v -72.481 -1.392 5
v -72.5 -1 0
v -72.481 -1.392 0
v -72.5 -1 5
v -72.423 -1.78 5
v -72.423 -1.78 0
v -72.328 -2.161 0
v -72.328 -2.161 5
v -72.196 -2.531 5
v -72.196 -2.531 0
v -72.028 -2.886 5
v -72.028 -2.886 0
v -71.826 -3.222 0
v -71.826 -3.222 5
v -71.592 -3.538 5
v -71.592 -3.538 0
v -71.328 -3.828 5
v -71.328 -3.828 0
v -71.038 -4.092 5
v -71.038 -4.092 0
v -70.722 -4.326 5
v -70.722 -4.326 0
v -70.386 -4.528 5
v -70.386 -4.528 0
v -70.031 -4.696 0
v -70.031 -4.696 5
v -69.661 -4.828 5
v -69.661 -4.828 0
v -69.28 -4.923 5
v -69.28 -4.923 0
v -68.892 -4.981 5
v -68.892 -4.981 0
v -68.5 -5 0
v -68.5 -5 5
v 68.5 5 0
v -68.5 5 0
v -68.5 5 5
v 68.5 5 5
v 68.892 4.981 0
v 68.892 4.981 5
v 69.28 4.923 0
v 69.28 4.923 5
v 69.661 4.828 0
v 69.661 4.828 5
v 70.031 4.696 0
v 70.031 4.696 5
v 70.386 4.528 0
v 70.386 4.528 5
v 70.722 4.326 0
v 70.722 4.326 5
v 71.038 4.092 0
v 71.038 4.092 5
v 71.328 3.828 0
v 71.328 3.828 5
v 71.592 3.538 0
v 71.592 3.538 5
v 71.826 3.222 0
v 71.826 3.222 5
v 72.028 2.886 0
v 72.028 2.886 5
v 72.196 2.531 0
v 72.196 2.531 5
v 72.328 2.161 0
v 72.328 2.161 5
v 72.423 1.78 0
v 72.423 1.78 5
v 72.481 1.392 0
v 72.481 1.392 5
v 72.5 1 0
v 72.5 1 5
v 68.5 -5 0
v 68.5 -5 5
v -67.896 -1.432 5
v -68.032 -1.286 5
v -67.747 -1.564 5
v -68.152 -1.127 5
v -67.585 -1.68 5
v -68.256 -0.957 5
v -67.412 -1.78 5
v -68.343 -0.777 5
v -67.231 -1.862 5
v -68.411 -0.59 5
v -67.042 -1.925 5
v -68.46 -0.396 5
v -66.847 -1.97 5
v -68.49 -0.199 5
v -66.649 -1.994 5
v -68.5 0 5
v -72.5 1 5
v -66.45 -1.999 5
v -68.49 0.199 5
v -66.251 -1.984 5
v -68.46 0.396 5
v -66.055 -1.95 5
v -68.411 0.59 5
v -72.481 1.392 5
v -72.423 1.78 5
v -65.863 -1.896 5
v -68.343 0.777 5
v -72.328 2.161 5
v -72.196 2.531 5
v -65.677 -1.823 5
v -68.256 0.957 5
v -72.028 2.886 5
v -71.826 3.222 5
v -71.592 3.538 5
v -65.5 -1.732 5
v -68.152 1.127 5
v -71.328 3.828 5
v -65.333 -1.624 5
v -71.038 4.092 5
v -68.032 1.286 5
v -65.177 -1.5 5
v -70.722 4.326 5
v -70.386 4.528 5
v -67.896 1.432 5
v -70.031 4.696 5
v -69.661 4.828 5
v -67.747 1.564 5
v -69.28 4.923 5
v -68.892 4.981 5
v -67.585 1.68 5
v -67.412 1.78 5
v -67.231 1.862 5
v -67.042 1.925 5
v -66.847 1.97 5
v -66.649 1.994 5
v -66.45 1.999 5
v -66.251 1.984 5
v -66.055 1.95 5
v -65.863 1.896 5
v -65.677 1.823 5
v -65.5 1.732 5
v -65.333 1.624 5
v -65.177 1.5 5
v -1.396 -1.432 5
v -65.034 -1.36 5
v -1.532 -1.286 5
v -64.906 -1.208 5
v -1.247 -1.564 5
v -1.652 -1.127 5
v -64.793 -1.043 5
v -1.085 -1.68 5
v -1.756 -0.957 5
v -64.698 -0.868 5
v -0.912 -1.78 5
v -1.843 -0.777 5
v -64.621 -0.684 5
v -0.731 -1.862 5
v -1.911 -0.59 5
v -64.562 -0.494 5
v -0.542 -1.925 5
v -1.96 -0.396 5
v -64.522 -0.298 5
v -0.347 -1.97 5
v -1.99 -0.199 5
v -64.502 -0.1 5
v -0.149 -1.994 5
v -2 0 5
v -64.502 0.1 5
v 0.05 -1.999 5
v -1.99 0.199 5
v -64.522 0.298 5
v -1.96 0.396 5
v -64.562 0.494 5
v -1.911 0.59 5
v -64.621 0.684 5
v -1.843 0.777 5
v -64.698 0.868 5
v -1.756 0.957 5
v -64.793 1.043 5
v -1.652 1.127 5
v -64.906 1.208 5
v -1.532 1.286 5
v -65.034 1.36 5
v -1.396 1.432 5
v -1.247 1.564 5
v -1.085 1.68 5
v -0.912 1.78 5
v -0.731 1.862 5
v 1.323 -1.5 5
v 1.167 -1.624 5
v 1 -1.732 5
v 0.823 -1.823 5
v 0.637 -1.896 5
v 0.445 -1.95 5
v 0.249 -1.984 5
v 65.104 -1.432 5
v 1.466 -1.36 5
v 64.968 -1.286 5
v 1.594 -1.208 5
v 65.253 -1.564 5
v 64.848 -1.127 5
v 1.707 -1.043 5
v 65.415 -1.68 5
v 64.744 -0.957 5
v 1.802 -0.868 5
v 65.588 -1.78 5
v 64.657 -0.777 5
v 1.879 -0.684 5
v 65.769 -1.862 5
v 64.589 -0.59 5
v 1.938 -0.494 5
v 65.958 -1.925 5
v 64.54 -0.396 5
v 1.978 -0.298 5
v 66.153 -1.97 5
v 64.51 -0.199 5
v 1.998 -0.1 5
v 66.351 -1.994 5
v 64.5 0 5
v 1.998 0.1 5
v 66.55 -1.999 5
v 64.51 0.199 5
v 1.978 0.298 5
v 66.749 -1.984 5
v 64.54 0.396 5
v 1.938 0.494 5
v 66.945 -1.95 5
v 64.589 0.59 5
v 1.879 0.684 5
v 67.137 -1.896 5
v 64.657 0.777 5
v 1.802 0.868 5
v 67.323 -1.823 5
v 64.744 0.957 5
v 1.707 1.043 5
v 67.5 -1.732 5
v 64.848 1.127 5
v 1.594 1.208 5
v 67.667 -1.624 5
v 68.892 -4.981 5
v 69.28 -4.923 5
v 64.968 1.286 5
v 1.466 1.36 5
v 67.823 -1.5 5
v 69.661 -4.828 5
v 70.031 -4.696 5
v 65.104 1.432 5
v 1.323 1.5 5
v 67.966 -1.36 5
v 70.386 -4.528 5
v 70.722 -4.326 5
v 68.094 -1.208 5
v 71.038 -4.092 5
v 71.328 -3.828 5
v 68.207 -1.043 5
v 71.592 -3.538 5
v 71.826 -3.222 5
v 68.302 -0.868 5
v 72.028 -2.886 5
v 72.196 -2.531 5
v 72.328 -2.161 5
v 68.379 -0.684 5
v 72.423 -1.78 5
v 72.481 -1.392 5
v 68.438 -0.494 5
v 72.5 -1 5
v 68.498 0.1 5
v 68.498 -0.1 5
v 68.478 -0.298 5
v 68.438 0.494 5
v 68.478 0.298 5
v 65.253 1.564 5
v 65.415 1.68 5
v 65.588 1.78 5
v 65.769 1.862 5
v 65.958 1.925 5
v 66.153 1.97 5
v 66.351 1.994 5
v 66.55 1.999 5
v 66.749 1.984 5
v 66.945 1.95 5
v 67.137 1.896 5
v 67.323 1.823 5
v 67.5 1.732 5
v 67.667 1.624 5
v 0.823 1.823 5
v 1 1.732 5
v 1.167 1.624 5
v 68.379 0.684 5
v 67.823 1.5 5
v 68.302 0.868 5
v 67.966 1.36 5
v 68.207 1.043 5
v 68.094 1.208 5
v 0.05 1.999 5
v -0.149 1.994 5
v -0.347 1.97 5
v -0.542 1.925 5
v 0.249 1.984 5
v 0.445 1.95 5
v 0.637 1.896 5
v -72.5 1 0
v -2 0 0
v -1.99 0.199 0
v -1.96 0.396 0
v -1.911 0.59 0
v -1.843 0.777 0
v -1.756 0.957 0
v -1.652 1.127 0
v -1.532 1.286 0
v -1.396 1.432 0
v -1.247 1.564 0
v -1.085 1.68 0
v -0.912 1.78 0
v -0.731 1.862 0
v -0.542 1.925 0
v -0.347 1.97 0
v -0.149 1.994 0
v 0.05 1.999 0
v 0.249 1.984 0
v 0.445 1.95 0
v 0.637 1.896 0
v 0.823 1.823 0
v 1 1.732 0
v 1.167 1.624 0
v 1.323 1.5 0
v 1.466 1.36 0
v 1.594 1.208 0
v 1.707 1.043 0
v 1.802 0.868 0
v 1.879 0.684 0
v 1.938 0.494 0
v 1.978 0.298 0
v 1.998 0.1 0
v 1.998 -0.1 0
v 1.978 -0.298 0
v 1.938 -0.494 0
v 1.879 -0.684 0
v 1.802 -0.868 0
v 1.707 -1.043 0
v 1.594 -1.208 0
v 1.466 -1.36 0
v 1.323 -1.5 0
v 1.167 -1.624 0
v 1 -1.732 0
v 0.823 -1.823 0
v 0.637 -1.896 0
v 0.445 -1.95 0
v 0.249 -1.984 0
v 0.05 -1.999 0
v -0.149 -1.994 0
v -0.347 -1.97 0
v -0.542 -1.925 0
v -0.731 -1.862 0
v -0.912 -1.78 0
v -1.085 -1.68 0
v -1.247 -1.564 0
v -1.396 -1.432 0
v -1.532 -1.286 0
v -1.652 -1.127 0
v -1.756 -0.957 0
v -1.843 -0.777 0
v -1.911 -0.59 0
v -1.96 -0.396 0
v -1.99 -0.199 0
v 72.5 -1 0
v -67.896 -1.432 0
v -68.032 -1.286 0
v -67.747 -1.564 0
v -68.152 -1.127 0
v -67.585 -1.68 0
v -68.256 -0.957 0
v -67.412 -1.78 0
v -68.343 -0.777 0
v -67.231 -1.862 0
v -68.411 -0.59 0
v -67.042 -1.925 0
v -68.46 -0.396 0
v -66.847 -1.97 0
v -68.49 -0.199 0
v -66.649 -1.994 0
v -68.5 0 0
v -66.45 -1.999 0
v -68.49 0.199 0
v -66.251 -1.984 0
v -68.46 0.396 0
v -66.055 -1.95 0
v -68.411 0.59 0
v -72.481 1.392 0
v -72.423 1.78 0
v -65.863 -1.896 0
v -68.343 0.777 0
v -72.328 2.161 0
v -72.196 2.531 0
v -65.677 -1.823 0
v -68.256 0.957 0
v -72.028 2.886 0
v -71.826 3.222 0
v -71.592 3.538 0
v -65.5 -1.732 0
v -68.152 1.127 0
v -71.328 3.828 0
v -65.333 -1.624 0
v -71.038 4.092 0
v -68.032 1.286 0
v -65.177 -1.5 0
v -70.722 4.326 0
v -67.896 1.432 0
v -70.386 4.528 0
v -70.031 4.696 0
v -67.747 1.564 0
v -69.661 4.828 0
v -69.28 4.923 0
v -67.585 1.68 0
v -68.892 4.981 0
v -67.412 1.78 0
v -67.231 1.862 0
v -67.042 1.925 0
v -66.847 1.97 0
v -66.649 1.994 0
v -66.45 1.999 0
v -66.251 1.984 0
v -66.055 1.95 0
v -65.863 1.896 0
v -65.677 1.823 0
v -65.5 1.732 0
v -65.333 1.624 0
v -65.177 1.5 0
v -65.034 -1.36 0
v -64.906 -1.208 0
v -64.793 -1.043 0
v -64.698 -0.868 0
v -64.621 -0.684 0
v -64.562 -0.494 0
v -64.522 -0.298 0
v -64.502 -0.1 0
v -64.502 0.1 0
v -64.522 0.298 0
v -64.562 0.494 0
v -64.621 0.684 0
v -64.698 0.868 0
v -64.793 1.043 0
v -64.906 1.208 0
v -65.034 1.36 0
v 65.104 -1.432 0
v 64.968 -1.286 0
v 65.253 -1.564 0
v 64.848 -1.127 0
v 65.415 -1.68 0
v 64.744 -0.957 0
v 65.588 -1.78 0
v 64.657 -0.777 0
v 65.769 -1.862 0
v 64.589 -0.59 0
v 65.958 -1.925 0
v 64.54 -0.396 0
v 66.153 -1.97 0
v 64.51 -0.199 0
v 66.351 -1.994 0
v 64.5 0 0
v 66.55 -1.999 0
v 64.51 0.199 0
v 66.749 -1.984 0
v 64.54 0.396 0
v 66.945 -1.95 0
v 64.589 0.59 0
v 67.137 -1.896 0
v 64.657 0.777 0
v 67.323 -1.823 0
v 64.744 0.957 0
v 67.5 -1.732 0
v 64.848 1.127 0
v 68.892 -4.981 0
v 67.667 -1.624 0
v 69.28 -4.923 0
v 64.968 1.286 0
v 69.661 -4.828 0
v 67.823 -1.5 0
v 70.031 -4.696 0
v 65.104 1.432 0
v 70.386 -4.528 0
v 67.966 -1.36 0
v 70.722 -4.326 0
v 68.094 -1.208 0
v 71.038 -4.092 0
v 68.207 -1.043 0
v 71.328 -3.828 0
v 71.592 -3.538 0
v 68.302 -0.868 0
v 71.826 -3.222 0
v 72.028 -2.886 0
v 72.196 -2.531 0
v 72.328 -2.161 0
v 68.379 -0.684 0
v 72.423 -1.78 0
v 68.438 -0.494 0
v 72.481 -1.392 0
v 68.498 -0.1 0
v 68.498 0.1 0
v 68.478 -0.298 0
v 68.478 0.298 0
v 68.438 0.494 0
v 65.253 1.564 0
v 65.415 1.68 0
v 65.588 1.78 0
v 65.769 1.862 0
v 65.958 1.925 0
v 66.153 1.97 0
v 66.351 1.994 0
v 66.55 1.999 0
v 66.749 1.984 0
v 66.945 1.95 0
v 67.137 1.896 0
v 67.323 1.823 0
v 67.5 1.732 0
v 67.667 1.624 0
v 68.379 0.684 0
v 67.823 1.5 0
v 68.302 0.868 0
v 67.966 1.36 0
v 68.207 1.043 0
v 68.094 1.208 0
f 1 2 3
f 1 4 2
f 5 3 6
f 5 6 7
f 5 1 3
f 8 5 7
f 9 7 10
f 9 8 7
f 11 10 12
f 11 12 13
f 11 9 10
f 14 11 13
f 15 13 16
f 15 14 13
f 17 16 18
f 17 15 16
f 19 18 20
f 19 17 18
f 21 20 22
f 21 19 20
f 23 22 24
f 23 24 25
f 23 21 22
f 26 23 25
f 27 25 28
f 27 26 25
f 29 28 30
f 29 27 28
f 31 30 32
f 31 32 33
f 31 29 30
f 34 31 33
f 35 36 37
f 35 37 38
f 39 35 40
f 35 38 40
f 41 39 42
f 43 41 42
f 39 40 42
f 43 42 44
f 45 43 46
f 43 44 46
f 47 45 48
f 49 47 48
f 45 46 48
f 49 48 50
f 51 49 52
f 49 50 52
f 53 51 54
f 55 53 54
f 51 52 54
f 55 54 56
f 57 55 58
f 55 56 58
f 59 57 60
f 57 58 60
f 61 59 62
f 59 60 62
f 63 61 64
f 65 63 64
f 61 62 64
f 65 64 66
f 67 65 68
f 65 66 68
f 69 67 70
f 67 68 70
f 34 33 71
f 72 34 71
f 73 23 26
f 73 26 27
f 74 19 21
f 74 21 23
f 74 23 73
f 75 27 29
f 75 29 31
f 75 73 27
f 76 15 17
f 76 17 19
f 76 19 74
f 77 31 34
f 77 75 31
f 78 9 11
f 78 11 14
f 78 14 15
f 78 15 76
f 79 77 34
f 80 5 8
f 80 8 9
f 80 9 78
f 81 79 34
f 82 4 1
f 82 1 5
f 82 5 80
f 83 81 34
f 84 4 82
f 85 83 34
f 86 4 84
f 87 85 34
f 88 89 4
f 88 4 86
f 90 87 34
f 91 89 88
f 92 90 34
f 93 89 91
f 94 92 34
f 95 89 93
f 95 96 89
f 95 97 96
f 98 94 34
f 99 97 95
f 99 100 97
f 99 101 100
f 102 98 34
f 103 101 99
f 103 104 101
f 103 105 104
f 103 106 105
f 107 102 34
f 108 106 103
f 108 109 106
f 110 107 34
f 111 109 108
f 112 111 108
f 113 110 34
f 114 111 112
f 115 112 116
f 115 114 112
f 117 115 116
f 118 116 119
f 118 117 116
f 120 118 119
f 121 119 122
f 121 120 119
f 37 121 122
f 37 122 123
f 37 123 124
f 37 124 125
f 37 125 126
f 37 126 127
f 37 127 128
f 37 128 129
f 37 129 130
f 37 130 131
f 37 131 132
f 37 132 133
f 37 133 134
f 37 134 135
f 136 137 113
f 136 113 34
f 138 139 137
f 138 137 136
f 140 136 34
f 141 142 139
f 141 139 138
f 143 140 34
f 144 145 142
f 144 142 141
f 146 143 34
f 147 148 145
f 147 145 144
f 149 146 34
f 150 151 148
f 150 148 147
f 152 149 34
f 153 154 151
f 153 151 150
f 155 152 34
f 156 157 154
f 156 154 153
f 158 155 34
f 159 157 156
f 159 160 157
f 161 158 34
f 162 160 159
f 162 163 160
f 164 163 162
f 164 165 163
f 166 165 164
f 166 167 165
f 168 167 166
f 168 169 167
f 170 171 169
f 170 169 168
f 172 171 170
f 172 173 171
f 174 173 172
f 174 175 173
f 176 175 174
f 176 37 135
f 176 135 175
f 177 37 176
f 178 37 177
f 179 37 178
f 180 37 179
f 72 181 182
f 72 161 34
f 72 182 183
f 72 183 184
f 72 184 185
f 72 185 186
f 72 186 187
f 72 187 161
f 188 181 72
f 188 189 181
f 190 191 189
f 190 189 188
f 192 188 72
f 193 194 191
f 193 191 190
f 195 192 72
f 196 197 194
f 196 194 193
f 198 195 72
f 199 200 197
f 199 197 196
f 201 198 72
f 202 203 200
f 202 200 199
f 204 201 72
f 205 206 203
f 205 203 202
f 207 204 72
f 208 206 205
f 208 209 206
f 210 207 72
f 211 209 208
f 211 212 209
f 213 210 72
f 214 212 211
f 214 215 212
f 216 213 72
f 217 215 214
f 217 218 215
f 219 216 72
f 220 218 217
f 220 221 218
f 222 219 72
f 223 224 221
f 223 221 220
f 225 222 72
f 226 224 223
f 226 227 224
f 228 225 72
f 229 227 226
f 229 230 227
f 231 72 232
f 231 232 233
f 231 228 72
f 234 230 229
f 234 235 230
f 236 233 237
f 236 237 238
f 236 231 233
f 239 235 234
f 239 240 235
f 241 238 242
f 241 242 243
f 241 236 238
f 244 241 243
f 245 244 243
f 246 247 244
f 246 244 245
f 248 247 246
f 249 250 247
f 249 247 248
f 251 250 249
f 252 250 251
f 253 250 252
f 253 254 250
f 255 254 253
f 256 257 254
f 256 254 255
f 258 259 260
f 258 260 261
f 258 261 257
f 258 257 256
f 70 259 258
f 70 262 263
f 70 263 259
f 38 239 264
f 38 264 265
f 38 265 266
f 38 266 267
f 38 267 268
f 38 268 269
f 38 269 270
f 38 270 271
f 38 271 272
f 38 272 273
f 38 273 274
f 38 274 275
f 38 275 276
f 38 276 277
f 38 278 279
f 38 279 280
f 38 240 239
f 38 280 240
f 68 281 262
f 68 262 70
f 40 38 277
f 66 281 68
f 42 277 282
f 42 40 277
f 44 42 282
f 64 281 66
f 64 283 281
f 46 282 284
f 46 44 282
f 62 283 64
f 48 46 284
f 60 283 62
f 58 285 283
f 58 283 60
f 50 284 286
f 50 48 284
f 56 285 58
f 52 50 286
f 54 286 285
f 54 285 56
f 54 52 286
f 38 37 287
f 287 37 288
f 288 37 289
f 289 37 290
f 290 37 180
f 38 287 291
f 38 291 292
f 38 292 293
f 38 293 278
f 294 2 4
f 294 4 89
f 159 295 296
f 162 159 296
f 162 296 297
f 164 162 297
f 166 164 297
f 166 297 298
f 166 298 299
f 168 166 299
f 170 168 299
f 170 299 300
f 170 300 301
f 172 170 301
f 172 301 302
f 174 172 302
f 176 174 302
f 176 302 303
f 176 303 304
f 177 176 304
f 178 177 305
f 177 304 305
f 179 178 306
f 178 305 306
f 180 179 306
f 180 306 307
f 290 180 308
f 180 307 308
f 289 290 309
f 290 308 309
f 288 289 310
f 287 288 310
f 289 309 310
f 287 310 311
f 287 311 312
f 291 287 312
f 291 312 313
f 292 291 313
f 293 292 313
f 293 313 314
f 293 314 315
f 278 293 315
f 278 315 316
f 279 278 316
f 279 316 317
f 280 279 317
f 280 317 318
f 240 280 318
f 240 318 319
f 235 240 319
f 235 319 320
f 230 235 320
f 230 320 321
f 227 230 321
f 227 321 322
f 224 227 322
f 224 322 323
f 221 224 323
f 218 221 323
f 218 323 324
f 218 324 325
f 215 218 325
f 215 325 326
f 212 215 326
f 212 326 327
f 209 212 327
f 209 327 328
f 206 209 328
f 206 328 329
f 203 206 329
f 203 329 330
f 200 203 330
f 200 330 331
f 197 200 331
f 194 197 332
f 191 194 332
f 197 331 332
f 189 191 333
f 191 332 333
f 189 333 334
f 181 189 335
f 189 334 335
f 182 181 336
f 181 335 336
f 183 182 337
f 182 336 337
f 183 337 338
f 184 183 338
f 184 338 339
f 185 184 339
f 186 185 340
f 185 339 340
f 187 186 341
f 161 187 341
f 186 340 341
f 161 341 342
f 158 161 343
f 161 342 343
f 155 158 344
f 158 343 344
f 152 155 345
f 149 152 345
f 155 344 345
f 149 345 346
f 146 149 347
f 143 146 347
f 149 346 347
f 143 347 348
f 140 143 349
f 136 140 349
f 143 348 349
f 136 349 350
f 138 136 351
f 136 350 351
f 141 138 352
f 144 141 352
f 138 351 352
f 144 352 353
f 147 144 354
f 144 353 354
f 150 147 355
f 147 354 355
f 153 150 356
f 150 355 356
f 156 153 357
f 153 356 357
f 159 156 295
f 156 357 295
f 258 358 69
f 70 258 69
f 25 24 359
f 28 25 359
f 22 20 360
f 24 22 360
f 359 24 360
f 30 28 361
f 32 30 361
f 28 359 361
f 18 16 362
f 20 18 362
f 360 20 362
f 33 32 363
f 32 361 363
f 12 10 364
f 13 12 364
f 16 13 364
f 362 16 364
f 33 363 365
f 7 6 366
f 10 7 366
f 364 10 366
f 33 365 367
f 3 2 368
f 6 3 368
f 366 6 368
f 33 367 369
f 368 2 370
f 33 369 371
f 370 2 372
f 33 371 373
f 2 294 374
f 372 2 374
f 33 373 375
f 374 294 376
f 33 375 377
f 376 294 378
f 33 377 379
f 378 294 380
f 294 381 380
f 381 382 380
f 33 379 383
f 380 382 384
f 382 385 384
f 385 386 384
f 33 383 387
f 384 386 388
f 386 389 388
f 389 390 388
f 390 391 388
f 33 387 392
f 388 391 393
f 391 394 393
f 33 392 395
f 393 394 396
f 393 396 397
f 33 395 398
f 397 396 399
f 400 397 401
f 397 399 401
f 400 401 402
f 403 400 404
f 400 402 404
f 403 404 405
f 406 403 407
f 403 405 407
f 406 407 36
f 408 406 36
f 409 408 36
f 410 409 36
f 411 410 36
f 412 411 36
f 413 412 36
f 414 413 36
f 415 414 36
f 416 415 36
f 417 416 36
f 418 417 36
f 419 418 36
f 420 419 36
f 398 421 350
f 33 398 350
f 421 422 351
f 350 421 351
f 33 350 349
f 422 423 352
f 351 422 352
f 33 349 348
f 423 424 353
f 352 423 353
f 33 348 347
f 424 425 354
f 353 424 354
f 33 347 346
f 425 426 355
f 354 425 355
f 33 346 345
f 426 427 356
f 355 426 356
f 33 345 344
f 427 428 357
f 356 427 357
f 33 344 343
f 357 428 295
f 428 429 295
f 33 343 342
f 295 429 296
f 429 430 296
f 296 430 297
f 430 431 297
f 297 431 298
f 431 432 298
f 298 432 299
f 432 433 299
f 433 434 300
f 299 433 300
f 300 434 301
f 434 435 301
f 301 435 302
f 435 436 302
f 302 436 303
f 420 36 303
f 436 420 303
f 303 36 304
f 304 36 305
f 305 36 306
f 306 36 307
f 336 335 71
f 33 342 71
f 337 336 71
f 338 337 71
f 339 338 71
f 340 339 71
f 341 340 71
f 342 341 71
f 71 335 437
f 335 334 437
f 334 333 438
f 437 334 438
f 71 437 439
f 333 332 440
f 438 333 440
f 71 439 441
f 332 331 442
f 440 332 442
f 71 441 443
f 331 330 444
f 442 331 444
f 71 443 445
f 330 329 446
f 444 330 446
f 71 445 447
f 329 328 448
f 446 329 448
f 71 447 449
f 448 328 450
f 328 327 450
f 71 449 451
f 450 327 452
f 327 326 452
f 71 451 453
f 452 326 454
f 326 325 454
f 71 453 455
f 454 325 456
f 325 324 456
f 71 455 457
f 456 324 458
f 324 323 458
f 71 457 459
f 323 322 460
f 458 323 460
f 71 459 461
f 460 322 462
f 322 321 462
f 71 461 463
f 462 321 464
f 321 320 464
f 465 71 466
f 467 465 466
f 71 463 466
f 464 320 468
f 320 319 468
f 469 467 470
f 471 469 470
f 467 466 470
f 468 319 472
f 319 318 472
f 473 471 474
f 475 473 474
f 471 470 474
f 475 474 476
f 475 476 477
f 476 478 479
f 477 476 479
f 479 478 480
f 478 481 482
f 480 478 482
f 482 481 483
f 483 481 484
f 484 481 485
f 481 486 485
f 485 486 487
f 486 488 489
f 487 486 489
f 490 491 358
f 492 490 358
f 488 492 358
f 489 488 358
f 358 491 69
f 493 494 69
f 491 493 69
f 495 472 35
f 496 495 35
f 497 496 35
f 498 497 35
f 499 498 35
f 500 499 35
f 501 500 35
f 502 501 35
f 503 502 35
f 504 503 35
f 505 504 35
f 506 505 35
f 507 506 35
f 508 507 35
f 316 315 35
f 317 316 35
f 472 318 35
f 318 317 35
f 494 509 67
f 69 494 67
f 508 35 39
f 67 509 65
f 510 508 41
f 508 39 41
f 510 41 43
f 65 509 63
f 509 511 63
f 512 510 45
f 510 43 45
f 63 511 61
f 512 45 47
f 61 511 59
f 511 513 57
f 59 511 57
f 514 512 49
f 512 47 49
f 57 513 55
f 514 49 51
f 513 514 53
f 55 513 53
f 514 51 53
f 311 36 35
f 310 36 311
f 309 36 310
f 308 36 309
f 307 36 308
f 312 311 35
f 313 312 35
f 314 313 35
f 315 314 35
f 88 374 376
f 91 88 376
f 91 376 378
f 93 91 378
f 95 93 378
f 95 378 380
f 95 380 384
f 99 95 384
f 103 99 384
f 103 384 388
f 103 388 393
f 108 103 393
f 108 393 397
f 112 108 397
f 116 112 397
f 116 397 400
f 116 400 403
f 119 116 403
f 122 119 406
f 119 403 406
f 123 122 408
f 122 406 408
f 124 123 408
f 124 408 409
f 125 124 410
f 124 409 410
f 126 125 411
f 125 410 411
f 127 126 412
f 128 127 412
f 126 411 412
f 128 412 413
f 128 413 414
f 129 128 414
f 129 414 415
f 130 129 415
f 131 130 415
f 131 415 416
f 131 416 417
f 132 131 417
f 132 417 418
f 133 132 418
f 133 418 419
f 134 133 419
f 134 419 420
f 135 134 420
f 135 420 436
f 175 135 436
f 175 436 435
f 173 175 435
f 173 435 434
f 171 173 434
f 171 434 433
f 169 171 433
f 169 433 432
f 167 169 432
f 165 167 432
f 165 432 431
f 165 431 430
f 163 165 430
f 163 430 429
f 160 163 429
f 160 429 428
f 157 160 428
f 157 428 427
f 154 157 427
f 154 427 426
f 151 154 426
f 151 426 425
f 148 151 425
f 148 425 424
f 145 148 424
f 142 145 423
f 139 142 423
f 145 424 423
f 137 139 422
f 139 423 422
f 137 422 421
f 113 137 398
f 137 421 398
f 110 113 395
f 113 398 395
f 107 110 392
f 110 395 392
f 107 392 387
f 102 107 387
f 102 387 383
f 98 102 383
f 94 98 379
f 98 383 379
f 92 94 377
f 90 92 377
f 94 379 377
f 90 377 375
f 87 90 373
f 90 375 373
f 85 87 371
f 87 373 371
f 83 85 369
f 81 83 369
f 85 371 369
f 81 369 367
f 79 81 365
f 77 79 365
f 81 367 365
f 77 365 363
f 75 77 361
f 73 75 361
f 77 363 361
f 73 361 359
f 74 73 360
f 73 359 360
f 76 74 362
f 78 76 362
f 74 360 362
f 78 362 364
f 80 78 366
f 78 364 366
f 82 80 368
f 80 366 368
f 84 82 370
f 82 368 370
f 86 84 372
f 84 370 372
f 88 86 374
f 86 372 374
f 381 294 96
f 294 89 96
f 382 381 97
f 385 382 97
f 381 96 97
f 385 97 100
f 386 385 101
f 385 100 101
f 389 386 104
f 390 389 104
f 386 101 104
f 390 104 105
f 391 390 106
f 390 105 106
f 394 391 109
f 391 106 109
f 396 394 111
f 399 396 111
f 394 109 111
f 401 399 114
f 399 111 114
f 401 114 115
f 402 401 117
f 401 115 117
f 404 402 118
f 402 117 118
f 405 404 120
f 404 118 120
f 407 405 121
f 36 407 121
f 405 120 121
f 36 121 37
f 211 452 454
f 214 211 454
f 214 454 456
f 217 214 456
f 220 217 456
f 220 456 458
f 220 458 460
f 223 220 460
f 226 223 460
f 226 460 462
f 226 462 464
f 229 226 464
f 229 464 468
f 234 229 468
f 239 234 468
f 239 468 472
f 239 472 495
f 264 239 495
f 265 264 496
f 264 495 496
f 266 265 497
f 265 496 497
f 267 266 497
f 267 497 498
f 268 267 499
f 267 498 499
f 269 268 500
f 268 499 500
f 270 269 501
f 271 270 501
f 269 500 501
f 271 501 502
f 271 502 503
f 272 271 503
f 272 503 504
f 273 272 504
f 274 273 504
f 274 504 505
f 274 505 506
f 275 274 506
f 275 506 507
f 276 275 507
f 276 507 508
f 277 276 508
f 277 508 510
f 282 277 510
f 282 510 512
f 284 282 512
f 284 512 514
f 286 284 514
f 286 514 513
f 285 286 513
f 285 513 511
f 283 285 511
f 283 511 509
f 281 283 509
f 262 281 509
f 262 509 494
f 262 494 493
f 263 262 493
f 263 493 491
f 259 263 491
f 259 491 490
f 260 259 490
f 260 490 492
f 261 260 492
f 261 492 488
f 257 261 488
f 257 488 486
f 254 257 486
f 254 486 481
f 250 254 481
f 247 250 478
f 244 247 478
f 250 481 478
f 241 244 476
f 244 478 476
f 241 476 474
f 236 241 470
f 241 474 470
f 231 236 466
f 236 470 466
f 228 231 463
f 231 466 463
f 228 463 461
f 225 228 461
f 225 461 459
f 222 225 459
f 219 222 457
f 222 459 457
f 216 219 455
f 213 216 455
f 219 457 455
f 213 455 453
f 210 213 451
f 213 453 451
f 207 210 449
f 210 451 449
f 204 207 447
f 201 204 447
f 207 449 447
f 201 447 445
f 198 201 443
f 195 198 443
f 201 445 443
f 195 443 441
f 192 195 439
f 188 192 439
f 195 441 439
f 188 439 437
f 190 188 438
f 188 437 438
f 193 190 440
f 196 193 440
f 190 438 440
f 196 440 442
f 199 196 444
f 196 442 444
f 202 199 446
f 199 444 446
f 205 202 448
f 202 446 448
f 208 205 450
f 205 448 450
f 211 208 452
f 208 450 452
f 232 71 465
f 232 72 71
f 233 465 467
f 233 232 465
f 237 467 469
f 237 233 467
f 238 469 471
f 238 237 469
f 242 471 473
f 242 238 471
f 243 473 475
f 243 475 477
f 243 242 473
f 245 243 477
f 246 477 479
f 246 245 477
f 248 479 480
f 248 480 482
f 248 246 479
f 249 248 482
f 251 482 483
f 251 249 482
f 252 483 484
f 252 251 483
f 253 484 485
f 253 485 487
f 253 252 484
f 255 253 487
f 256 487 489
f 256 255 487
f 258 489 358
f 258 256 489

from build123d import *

# Parameters (mm, degrees)
SZKIC1_W                    = 145
SZKIC1_H                    = 10
DODANIE_WYCI_GNI_CIE1_DEPTH = 5
OTWORY_USTALAJ_CE_4_0MM1_D  = 4
ZAOKR_GLENIE1_R             = 4


with BuildPart() as part:
    # Szkic1 → Dodanie-wyciągnięcie1 (new body)
    with BuildSketch(Plane.XY):
        Rectangle(SZKIC1_W, SZKIC1_H)
    extrude(amount=DODANIE_WYCI_GNI_CIE1_DEPTH)

    # Otwory ustalające Ø4.0mm1 (through all)
    with Locations(Plane.XY.offset(5)):
        with Locations((0, 0), (-66.5, 0), (66.5, 0)):
            Hole(OTWORY_USTALAJ_CE_4_0MM1_D / 2)

    # Zaokrąglenie1
    zaokr_glenie1_edges = [part.edges().sort_by_distance(p)[0] for p in [
        (72.5, -5, 2.5),
        (-72.5, -5, 2.5),
        (-72.5, 5, 2.5),
        (72.5, 5, 2.5),
    ]]
    fillet(zaokr_glenie1_edges, radius=ZAOKR_GLENIE1_R)


solid = part.part
